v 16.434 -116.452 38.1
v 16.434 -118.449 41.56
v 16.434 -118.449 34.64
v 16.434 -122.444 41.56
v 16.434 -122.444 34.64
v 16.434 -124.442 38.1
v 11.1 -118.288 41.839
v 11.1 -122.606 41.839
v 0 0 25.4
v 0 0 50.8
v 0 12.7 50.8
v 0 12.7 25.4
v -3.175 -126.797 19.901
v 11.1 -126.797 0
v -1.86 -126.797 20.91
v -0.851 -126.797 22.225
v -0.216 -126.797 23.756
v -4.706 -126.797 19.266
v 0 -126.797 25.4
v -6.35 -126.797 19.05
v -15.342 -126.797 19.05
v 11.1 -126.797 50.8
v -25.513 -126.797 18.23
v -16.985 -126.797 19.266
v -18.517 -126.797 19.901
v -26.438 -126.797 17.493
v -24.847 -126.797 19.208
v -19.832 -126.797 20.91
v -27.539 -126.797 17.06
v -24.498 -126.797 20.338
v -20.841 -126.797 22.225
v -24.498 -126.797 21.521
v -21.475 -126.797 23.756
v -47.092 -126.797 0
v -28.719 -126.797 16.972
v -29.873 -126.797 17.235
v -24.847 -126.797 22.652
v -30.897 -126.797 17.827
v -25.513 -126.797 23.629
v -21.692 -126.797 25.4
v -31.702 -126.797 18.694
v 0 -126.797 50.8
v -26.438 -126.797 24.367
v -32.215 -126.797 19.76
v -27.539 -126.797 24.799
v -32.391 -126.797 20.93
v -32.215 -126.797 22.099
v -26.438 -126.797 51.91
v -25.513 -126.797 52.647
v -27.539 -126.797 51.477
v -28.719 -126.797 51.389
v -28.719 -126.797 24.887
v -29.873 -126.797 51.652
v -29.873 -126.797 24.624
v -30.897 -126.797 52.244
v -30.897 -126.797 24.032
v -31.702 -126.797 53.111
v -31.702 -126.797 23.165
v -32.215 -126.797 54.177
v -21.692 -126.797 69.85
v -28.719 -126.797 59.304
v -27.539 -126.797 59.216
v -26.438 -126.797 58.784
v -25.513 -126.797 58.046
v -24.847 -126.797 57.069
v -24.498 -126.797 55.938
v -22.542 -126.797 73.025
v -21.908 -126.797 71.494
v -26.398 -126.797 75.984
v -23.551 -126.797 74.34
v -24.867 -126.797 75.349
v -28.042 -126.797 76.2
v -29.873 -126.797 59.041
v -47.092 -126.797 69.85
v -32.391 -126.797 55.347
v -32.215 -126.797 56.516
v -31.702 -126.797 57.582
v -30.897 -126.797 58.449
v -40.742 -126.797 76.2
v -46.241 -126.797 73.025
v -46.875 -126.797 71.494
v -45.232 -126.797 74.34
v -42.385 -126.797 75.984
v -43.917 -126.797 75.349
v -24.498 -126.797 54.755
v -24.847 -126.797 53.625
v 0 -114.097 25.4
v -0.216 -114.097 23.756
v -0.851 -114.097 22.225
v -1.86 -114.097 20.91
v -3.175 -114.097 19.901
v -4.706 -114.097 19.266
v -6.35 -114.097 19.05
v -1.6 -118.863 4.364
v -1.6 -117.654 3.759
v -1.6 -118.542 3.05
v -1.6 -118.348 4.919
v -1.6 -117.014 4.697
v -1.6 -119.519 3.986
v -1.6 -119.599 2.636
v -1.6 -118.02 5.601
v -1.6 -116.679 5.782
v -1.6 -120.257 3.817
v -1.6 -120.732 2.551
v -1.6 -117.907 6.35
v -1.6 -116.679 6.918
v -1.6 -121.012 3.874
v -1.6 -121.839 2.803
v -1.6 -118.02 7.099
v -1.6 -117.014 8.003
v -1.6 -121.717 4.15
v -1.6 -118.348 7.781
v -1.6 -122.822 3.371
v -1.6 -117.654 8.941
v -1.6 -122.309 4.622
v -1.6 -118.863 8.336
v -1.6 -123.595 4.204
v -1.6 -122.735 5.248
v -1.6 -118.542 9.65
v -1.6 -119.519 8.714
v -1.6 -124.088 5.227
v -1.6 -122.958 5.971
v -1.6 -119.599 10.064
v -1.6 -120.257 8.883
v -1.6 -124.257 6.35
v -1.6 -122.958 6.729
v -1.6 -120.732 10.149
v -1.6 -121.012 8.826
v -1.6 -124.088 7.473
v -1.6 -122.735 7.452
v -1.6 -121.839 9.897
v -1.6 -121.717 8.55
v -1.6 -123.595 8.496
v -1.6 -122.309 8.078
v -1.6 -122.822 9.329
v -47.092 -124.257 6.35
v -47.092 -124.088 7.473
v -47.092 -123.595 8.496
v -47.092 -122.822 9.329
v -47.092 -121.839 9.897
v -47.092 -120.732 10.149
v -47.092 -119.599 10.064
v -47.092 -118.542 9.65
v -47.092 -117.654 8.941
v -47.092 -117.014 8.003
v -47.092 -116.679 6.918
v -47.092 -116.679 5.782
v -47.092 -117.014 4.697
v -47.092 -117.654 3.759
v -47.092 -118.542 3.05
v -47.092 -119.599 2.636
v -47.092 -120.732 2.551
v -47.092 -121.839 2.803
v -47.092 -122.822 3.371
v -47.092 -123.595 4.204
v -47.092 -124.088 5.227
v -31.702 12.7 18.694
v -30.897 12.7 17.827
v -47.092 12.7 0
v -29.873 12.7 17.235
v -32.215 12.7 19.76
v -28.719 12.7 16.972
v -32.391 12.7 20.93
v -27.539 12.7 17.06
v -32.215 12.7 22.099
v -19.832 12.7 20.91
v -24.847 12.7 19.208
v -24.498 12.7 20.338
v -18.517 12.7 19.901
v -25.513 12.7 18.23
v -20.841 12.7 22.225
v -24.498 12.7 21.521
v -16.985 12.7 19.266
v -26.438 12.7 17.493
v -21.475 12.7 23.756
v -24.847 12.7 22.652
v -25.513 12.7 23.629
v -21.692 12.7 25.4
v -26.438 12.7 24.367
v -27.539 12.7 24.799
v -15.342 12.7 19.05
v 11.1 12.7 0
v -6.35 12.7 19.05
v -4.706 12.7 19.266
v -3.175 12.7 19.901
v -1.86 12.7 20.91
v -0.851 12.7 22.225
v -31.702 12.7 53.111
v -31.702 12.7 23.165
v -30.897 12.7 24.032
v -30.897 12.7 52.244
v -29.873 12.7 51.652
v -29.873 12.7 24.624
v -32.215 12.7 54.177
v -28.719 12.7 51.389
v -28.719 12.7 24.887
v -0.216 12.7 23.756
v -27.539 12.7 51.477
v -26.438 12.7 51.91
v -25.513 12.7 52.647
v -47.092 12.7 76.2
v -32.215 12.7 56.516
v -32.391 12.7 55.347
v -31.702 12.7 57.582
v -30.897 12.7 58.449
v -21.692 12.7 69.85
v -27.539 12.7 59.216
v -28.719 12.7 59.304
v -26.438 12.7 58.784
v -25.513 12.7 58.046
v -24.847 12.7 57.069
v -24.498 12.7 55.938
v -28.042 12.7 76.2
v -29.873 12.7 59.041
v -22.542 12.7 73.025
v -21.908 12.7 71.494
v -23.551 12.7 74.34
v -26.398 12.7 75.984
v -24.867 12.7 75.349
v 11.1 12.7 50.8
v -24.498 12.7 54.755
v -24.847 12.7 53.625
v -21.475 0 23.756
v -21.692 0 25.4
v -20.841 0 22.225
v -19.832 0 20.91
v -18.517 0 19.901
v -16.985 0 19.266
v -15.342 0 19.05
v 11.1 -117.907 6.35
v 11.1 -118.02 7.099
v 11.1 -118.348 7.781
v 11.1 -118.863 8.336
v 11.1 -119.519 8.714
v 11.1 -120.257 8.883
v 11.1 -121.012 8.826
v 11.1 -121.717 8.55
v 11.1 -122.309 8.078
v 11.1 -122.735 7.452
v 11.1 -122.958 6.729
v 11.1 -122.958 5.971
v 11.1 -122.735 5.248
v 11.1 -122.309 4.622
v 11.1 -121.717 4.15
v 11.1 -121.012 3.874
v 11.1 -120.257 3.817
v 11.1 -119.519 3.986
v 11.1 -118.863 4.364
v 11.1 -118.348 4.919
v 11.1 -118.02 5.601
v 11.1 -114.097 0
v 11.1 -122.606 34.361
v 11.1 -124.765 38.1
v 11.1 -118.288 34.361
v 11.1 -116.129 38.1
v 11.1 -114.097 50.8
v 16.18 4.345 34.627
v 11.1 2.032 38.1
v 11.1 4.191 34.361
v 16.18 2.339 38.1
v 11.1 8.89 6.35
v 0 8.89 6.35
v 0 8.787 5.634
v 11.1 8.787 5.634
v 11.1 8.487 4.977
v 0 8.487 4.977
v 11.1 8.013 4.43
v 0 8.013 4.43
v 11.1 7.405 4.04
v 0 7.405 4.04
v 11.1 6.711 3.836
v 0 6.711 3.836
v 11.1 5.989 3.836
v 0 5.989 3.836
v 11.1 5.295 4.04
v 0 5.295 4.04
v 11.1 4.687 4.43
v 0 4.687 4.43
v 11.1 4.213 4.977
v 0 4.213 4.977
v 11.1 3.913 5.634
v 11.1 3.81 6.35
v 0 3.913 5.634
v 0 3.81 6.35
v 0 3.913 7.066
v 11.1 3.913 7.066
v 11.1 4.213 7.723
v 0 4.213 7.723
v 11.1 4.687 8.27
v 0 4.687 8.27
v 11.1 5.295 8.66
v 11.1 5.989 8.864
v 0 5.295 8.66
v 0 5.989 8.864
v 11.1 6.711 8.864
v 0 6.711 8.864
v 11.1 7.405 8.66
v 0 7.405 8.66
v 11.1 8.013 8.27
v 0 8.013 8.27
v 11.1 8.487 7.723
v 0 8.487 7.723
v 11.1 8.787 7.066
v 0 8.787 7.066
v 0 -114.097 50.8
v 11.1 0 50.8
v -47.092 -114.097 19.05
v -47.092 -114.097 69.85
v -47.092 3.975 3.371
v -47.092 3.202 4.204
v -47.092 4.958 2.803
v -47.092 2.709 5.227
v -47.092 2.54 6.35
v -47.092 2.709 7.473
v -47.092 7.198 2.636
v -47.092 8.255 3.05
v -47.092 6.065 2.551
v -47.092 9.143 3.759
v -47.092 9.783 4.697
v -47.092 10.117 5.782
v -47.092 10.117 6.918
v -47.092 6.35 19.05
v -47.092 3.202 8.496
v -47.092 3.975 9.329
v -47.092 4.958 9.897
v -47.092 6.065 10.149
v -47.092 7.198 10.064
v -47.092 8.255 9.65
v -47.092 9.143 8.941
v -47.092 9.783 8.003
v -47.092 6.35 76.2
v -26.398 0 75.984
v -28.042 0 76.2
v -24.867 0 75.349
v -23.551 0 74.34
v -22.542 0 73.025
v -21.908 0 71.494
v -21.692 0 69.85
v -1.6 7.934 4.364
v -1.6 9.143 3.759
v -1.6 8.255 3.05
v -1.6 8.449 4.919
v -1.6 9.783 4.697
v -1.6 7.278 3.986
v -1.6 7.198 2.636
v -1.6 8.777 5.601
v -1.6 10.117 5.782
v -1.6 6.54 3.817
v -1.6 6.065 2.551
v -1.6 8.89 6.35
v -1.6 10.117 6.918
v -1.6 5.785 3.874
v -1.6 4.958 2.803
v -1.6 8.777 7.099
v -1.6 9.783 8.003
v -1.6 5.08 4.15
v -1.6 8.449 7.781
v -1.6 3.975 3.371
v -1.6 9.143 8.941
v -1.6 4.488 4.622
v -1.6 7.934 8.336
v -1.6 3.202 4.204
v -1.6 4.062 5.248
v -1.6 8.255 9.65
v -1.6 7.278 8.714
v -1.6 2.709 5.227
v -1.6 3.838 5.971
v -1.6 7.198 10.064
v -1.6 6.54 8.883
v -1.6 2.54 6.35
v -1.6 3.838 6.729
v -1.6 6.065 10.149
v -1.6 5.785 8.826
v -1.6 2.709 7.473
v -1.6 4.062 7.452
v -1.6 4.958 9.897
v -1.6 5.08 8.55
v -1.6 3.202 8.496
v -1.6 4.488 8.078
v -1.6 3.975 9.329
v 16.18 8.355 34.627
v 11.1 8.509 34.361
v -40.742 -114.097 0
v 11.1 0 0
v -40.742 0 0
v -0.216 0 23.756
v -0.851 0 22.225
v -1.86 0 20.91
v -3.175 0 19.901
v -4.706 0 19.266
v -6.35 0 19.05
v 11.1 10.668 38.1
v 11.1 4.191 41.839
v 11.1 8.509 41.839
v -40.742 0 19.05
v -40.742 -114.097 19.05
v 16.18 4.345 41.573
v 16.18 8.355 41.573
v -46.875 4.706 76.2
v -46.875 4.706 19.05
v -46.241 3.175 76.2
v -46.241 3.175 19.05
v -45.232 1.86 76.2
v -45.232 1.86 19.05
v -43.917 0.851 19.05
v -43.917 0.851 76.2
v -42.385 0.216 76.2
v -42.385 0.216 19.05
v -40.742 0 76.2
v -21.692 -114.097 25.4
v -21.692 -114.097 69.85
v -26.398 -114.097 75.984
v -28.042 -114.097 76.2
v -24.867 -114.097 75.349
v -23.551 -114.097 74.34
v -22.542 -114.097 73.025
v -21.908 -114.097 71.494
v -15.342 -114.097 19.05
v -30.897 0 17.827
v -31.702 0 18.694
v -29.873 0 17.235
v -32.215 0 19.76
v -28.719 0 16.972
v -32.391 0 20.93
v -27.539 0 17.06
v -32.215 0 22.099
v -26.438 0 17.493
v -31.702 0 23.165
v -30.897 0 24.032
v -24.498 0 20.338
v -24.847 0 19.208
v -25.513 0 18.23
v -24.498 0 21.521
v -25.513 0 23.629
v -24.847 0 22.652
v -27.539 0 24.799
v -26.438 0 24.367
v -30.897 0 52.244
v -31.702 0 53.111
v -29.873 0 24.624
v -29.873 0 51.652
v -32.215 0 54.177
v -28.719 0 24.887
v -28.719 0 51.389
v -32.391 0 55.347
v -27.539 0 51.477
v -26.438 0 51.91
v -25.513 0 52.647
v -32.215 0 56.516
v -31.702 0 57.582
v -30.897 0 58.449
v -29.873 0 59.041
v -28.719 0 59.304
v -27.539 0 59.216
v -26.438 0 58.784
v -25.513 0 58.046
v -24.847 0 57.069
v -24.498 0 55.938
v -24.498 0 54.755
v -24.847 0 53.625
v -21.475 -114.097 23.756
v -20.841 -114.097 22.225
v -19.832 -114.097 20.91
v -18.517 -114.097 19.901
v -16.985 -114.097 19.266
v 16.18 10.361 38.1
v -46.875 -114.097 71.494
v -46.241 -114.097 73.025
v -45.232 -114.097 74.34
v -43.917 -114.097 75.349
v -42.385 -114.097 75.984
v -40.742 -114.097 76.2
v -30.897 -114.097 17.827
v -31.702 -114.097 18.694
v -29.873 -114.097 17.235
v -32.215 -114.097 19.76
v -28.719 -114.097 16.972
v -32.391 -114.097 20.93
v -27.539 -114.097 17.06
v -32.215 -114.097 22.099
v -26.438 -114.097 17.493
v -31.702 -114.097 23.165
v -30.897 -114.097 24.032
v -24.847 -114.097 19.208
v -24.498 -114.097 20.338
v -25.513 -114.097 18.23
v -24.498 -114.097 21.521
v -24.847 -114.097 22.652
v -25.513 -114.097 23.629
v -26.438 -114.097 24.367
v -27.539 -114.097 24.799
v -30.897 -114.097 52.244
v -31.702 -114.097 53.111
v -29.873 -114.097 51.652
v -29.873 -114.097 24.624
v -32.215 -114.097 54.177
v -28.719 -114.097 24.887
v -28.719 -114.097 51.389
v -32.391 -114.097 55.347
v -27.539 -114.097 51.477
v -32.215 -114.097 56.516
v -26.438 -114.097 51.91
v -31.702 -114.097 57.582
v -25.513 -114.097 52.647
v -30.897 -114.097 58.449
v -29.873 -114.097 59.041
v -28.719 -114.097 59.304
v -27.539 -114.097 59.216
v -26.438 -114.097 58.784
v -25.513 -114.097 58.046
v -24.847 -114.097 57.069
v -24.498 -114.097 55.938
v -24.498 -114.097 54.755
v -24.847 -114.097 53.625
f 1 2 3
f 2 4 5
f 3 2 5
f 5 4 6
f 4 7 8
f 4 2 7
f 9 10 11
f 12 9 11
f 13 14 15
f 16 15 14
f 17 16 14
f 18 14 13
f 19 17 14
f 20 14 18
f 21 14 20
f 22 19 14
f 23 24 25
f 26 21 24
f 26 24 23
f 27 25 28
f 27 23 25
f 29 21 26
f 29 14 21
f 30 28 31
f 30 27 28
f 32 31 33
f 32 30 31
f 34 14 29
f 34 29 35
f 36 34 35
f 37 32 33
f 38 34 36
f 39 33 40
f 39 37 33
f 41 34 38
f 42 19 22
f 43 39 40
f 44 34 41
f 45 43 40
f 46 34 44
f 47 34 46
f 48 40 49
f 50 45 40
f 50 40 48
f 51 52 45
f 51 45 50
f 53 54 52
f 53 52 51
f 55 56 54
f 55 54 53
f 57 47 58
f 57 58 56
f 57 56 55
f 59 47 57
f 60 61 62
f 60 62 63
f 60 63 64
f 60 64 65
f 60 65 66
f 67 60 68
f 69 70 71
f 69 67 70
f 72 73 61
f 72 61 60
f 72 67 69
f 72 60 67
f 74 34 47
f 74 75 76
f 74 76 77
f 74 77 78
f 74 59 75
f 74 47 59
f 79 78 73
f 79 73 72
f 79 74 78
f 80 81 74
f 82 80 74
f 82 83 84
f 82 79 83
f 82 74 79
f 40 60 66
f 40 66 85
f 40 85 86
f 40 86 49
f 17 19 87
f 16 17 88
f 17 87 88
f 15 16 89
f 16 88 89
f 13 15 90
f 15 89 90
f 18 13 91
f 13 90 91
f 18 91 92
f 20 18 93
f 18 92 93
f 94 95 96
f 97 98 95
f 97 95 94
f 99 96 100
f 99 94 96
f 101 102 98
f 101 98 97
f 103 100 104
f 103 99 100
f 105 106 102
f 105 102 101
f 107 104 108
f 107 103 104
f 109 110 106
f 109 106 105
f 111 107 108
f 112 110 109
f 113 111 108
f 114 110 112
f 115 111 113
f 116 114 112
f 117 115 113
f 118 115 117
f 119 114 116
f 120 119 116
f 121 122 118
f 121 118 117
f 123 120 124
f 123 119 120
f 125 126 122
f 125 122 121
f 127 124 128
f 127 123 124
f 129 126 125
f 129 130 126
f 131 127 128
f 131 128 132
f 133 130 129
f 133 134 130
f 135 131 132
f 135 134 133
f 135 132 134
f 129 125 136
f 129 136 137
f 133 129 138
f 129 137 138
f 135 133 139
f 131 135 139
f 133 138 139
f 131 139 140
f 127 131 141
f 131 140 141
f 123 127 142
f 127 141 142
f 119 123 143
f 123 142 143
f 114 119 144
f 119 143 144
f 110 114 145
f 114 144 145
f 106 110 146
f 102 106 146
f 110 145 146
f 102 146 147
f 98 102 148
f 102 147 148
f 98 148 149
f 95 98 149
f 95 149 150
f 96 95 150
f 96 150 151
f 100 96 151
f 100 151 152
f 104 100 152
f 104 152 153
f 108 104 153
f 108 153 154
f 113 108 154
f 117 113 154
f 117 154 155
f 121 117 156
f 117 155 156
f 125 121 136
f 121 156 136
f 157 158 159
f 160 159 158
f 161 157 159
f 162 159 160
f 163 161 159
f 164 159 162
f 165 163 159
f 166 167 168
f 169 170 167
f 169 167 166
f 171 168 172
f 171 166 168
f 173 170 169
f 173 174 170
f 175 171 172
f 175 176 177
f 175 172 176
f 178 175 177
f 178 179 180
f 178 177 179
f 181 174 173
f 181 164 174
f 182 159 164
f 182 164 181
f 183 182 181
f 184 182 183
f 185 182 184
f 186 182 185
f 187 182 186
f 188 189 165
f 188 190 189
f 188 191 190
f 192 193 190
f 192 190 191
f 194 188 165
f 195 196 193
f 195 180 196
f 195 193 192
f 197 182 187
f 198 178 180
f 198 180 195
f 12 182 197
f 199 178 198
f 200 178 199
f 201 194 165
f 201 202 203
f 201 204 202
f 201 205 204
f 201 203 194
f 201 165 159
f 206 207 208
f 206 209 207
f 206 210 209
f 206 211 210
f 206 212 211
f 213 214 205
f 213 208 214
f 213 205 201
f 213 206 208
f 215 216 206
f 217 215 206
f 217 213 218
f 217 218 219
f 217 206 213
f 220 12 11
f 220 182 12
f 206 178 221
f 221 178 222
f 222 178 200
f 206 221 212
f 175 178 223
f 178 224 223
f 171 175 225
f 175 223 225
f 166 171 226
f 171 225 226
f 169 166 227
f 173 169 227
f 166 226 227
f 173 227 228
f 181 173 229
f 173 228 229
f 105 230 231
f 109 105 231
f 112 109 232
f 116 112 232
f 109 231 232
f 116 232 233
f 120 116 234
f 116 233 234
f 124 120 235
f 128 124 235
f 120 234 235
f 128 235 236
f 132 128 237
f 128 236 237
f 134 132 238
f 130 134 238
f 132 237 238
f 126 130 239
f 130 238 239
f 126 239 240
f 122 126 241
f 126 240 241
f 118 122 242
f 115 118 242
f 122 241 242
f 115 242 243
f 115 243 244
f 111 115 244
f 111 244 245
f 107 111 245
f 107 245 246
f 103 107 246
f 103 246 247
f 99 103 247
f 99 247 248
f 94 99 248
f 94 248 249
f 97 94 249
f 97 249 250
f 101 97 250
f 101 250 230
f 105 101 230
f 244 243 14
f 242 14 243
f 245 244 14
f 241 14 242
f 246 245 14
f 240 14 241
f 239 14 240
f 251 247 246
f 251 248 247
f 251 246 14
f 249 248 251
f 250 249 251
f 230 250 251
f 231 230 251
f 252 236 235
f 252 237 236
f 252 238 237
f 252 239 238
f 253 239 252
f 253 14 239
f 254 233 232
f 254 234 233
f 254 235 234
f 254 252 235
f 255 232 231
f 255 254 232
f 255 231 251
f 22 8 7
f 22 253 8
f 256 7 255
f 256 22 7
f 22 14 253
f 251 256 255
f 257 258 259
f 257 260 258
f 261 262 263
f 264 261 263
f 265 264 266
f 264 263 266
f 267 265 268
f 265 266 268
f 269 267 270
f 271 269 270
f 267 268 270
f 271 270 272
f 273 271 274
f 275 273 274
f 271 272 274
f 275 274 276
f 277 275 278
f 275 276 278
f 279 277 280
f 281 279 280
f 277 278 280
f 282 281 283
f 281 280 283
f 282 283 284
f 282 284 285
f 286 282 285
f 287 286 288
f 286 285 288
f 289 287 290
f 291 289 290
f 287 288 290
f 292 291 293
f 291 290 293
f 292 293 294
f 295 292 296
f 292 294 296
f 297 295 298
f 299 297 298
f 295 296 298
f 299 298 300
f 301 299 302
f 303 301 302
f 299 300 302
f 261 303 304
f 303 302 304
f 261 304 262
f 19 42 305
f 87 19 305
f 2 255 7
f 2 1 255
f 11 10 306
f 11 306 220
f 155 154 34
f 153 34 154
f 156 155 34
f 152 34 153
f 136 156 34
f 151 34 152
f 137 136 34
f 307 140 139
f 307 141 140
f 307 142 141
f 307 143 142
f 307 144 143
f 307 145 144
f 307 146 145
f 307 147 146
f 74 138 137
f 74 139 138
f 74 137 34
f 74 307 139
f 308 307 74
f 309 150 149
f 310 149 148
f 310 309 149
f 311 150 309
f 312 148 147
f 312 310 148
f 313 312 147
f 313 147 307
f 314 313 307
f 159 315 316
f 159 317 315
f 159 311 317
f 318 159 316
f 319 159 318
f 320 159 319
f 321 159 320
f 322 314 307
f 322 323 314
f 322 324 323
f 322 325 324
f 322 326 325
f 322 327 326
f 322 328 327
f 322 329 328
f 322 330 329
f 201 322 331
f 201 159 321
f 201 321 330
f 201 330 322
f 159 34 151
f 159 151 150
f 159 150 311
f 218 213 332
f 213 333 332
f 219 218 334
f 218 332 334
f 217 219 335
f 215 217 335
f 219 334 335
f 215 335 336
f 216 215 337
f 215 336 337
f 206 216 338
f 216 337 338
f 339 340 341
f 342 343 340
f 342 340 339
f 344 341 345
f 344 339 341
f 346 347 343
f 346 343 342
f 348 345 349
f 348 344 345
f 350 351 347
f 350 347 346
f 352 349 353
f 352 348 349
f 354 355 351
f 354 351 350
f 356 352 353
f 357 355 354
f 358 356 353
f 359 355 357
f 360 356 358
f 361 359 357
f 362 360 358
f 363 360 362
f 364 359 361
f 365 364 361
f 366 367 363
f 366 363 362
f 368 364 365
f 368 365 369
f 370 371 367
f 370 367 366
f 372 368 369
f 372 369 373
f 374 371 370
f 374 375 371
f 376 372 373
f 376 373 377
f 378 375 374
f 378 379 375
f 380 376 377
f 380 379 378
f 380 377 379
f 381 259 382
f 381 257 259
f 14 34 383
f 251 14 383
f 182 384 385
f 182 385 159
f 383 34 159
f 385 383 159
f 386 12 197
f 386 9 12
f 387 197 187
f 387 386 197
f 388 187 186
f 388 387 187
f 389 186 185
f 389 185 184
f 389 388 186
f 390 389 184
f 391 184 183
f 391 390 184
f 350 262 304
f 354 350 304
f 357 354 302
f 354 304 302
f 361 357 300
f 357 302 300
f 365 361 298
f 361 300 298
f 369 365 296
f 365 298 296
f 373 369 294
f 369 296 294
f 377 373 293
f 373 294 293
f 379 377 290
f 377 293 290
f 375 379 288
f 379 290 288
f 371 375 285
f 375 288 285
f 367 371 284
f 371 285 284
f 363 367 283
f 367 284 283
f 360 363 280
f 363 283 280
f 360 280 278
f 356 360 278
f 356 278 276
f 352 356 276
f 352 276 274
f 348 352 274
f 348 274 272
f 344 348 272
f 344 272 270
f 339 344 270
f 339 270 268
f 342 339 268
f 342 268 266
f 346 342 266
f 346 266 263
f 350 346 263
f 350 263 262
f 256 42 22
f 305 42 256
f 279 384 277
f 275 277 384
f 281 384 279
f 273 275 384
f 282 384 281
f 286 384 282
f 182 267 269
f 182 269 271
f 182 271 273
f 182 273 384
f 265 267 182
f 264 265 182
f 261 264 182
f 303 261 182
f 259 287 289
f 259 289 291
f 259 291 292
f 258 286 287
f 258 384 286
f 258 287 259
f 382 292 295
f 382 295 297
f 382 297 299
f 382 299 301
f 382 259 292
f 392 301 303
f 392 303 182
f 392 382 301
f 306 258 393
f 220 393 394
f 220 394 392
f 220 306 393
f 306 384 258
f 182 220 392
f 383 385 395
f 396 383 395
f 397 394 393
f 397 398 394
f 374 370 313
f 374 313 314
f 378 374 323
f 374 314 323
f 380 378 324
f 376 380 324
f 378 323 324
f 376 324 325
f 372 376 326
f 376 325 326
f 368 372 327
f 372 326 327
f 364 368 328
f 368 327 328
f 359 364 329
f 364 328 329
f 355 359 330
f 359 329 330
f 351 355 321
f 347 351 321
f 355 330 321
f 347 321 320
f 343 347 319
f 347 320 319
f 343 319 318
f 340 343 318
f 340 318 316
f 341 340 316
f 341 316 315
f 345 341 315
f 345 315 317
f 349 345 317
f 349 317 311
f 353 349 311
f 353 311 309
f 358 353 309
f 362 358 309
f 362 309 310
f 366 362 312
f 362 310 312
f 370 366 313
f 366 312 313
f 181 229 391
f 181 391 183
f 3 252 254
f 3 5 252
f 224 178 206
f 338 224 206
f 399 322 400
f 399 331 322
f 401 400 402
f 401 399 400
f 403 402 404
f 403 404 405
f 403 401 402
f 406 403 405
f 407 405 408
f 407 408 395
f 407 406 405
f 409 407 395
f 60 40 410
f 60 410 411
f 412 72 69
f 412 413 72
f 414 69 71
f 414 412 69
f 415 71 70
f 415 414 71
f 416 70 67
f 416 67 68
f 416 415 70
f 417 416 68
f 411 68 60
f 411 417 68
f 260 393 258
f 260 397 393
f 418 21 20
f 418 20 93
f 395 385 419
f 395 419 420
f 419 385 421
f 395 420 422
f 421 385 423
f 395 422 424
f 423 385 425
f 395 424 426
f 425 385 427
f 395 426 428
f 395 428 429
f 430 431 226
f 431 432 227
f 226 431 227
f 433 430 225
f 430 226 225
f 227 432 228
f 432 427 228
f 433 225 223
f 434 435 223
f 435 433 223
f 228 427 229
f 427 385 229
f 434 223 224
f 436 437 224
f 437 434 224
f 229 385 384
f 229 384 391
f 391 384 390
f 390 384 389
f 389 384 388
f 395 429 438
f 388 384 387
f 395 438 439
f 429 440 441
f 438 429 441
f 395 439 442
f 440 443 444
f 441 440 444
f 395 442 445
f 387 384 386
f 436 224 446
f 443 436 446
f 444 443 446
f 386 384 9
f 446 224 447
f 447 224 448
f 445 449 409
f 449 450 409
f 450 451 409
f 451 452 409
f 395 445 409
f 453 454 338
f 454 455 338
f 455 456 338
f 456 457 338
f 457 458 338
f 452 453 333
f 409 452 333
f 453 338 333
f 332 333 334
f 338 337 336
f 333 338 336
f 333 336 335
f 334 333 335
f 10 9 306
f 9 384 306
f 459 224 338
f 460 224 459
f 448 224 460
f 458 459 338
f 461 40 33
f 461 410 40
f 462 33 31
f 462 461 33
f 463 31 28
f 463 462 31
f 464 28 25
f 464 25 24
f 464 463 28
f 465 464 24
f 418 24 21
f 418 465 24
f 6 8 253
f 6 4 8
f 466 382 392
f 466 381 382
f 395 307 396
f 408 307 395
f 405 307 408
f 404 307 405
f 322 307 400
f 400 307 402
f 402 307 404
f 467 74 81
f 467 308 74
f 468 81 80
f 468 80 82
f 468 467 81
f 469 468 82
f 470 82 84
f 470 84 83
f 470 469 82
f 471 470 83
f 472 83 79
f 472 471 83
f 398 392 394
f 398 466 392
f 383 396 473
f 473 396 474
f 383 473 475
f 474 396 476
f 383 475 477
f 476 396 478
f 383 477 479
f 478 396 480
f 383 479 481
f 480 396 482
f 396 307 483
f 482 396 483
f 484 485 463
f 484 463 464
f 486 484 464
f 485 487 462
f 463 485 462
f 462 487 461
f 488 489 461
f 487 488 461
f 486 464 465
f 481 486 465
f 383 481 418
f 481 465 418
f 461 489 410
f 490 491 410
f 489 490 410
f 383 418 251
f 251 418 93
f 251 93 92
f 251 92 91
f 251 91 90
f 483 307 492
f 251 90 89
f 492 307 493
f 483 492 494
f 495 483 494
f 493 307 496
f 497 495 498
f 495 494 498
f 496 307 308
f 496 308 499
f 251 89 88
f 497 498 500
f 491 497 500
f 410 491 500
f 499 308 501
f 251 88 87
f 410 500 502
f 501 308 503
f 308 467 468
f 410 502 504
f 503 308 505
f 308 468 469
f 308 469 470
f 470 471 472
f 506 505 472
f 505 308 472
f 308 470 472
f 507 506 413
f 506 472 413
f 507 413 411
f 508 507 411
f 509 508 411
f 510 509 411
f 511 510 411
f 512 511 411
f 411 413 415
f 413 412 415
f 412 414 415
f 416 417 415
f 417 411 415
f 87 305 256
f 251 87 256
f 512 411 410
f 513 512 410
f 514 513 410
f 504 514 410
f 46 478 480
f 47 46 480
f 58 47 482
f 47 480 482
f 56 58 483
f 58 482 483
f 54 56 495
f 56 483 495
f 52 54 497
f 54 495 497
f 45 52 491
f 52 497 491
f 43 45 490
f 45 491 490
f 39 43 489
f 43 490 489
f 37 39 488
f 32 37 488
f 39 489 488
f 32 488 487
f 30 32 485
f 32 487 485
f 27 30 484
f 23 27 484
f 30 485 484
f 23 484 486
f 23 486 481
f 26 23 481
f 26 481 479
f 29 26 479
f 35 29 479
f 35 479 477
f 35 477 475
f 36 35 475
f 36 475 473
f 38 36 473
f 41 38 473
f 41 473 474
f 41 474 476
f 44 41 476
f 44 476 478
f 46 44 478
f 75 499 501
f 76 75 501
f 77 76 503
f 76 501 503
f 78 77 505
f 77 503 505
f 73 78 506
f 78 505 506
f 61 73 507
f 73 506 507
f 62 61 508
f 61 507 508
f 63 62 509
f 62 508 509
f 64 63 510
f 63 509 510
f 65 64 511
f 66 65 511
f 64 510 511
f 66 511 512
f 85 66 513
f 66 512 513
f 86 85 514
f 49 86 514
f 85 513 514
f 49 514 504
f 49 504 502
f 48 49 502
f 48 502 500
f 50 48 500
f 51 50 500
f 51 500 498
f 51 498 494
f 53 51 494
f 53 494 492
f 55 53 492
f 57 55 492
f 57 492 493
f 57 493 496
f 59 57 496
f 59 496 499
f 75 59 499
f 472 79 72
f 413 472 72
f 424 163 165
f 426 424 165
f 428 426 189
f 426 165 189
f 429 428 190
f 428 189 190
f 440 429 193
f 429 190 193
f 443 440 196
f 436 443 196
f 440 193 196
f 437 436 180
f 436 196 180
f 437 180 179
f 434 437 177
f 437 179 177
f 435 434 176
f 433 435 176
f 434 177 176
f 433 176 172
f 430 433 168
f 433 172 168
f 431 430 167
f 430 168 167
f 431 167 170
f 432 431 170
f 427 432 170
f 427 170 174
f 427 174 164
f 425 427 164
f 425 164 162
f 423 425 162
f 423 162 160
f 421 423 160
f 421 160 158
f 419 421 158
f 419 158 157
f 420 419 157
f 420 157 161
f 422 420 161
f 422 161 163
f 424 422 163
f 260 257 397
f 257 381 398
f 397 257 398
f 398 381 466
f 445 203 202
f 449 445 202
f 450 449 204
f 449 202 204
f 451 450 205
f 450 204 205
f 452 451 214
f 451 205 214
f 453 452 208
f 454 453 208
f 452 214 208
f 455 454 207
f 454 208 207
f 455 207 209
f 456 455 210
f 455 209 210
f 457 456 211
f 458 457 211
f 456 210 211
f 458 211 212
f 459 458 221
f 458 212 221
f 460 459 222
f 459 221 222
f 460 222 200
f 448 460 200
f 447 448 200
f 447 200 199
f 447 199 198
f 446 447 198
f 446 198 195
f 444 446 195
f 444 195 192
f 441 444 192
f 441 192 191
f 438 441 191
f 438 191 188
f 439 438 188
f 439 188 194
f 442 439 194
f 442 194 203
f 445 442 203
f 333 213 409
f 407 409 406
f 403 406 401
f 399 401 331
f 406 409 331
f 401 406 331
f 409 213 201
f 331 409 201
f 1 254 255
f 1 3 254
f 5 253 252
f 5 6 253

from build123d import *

# Parameters (mm, degrees)
F0_W      = 12.7
F0_H      = 50.8
F1_DEPTH  = 11.0998
F3_DEPTH  = 5.08
F3_TAPER  = 3
F4_W      = 12.7
F4_H      = 19.05
F5_DEPTH  = 47.0916
F6_W      = 6.35
F6_H      = 19.05
F7_DEPTH  = 126.7968
F8_W      = 12.7
F8_H      = 19.05
F9_DEPTH  = 40.7416
F10_W     = 12.7
F10_H     = 50.8
F11_DEPTH = 11.0998
F13_DEPTH = 5.334
F13_TAPER = 3
F14_W     = 25.4
F14_H     = 76.2
F15_DEPTH = 12.7
F16_W     = 25.4
F16_H     = 76.2
F17_DEPTH = 12.7
F18_R     = 3.96875
F19_DEPTH = 139.4978
F20_R     = 2.54
F21_DEPTH = 16.4348001
F22_R     = 2.54
F23_DEPTH = 58.1924
F24_R     = 3.81
F25_DEPTH = 45.4914
F26_R     = 6.35


with BuildPart() as f1:
    # F0 (on Right) → F1 (new body)
    with BuildSketch(Plane.YZ):
        with Locations((6.35, 25.4)):
            Rectangle(F0_W, F0_H)
    extrude(amount=F1_DEPTH)

    # F2 (on face) → F3 (join)
    with BuildSketch(Plane.YZ.offset(11.0998)):
        Polygon((4.191, 34.3605023065), (8.509, 34.3605023065), (10.668, 38.1), (8.509, 41.8394976935), (4.191, 41.8394976935), (2.032, 38.1), align=None)
    extrude(amount=F3_DEPTH, taper=F3_TAPER)

    # F4 (on face) → F5 (join)
    with BuildSketch(Plane(origin=(0, 0, 0), x_dir=(0, -1, 0), z_dir=(-1, 0, 0))):
        with Locations((-6.35, 9.525)):
            Rectangle(F4_W, F4_H)
    extrude(amount=F5_DEPTH)

    # F6 (on face) → F7 (join)
    with BuildSketch(Plane.XZ):
        with Locations((-43.9166, 9.525)):
            Rectangle(F6_W, F6_H)
    extrude(amount=F7_DEPTH)

    # F8 (on face) → F9 (join, through all)
    with BuildSketch(Plane.YZ.offset(-40.7416)):
        with Locations((-120.4468, 9.525)):
            Rectangle(F8_W, F8_H)
    extrude(amount=F9_DEPTH)

    # F10 (on face) → F11 (join)
    with BuildSketch(Plane.YZ):
        with Locations((-120.4468, 25.4)):
            Rectangle(F10_W, F10_H)
    extrude(amount=F11_DEPTH)

    # F12 (on face) → F13 (join)
    with BuildSketch(Plane.YZ.offset(11.0998)):
        Polygon((-118.2878, 41.8394976935), (-122.6058, 41.8394976935), (-124.7648, 38.1), (-122.6058, 34.3605023065), (-118.2878, 34.3605023065), (-116.1288, 38.1), align=None)
    extrude(amount=F13_DEPTH, taper=F13_TAPER)

    # F14 (on face) → F15 (join, through all)
    with BuildSketch(Plane(origin=(0, 12.7, 0), x_dir=(-1, 0, 0), z_dir=(0, 1, 0))):
        with Locations((34.3916, 38.1)):
            Rectangle(F14_W, F14_H)
    extrude(amount=-F15_DEPTH)

    # F16 (on face) → F17 (join, through all)
    with BuildSketch(Plane.XZ.offset(126.7968)):
        with Locations((-34.3916, 38.1)):
            Rectangle(F16_W, F16_H)
    extrude(amount=-F17_DEPTH)

    # F18 (on face) → F19 (cut, through all)
    with BuildSketch(Plane(origin=(0, 12.7, 0), x_dir=(-1, 0, 0), z_dir=(0, 1, 0))):
        with Locations((28.4226, 20.9296)):
            Circle(F18_R)
        with Locations((28.4226, 55.3466)):
            Circle(F18_R)
    extrude(amount=-F19_DEPTH, mode=Mode.SUBTRACT)

    # F20 (on face) → F21 (cut, through all)
    with BuildSketch(Plane(origin=(0, 0, 0), x_dir=(0, -1, 0), z_dir=(-1, 0, 0))):
        with Locations((-6.35, 6.35)):
            Circle(F20_R)
    extrude(amount=-F21_DEPTH, mode=Mode.SUBTRACT)

    # F22 (on face) → F23 (cut, through all)
    with BuildSketch(Plane.YZ.offset(11.0998)):
        with Locations((-120.4468, 6.35)):
            Circle(F22_R)
        with Locations((6.35, 6.35)):
            Circle(F22_R)
    extrude(amount=-F23_DEPTH, mode=Mode.SUBTRACT)

    # F24 (on face) → F25 (cut, through all)
    with BuildSketch(Plane(origin=(-47.0916, 0, 0), x_dir=(0, -1, 0), z_dir=(-1, 0, 0))):
        with Locations((120.4468, 6.35)):
            Circle(F24_R)
        with Locations((-6.35, 6.35)):
            Circle(F24_R)
    extrude(amount=-F25_DEPTH, mode=Mode.SUBTRACT)

    # F26
    f26_edges = [f1.edges().sort_by_distance(p)[0] for p in [
        (0, 6.35, 19.05),
        (-21.6916, 6.35, 19.05),
        (-21.6916, -120.4468, 19.05),
        (0, -120.4468, 19.05),
        (-47.0916, 0, 47.625),
        (-21.6916, 6.35, 76.2),
        (-47.0916, -120.4468, 76.2),
        (-21.6916, -120.4468, 76.2),
    ]]
    fillet(f26_edges, radius=F26_R)


solid = f1.part
